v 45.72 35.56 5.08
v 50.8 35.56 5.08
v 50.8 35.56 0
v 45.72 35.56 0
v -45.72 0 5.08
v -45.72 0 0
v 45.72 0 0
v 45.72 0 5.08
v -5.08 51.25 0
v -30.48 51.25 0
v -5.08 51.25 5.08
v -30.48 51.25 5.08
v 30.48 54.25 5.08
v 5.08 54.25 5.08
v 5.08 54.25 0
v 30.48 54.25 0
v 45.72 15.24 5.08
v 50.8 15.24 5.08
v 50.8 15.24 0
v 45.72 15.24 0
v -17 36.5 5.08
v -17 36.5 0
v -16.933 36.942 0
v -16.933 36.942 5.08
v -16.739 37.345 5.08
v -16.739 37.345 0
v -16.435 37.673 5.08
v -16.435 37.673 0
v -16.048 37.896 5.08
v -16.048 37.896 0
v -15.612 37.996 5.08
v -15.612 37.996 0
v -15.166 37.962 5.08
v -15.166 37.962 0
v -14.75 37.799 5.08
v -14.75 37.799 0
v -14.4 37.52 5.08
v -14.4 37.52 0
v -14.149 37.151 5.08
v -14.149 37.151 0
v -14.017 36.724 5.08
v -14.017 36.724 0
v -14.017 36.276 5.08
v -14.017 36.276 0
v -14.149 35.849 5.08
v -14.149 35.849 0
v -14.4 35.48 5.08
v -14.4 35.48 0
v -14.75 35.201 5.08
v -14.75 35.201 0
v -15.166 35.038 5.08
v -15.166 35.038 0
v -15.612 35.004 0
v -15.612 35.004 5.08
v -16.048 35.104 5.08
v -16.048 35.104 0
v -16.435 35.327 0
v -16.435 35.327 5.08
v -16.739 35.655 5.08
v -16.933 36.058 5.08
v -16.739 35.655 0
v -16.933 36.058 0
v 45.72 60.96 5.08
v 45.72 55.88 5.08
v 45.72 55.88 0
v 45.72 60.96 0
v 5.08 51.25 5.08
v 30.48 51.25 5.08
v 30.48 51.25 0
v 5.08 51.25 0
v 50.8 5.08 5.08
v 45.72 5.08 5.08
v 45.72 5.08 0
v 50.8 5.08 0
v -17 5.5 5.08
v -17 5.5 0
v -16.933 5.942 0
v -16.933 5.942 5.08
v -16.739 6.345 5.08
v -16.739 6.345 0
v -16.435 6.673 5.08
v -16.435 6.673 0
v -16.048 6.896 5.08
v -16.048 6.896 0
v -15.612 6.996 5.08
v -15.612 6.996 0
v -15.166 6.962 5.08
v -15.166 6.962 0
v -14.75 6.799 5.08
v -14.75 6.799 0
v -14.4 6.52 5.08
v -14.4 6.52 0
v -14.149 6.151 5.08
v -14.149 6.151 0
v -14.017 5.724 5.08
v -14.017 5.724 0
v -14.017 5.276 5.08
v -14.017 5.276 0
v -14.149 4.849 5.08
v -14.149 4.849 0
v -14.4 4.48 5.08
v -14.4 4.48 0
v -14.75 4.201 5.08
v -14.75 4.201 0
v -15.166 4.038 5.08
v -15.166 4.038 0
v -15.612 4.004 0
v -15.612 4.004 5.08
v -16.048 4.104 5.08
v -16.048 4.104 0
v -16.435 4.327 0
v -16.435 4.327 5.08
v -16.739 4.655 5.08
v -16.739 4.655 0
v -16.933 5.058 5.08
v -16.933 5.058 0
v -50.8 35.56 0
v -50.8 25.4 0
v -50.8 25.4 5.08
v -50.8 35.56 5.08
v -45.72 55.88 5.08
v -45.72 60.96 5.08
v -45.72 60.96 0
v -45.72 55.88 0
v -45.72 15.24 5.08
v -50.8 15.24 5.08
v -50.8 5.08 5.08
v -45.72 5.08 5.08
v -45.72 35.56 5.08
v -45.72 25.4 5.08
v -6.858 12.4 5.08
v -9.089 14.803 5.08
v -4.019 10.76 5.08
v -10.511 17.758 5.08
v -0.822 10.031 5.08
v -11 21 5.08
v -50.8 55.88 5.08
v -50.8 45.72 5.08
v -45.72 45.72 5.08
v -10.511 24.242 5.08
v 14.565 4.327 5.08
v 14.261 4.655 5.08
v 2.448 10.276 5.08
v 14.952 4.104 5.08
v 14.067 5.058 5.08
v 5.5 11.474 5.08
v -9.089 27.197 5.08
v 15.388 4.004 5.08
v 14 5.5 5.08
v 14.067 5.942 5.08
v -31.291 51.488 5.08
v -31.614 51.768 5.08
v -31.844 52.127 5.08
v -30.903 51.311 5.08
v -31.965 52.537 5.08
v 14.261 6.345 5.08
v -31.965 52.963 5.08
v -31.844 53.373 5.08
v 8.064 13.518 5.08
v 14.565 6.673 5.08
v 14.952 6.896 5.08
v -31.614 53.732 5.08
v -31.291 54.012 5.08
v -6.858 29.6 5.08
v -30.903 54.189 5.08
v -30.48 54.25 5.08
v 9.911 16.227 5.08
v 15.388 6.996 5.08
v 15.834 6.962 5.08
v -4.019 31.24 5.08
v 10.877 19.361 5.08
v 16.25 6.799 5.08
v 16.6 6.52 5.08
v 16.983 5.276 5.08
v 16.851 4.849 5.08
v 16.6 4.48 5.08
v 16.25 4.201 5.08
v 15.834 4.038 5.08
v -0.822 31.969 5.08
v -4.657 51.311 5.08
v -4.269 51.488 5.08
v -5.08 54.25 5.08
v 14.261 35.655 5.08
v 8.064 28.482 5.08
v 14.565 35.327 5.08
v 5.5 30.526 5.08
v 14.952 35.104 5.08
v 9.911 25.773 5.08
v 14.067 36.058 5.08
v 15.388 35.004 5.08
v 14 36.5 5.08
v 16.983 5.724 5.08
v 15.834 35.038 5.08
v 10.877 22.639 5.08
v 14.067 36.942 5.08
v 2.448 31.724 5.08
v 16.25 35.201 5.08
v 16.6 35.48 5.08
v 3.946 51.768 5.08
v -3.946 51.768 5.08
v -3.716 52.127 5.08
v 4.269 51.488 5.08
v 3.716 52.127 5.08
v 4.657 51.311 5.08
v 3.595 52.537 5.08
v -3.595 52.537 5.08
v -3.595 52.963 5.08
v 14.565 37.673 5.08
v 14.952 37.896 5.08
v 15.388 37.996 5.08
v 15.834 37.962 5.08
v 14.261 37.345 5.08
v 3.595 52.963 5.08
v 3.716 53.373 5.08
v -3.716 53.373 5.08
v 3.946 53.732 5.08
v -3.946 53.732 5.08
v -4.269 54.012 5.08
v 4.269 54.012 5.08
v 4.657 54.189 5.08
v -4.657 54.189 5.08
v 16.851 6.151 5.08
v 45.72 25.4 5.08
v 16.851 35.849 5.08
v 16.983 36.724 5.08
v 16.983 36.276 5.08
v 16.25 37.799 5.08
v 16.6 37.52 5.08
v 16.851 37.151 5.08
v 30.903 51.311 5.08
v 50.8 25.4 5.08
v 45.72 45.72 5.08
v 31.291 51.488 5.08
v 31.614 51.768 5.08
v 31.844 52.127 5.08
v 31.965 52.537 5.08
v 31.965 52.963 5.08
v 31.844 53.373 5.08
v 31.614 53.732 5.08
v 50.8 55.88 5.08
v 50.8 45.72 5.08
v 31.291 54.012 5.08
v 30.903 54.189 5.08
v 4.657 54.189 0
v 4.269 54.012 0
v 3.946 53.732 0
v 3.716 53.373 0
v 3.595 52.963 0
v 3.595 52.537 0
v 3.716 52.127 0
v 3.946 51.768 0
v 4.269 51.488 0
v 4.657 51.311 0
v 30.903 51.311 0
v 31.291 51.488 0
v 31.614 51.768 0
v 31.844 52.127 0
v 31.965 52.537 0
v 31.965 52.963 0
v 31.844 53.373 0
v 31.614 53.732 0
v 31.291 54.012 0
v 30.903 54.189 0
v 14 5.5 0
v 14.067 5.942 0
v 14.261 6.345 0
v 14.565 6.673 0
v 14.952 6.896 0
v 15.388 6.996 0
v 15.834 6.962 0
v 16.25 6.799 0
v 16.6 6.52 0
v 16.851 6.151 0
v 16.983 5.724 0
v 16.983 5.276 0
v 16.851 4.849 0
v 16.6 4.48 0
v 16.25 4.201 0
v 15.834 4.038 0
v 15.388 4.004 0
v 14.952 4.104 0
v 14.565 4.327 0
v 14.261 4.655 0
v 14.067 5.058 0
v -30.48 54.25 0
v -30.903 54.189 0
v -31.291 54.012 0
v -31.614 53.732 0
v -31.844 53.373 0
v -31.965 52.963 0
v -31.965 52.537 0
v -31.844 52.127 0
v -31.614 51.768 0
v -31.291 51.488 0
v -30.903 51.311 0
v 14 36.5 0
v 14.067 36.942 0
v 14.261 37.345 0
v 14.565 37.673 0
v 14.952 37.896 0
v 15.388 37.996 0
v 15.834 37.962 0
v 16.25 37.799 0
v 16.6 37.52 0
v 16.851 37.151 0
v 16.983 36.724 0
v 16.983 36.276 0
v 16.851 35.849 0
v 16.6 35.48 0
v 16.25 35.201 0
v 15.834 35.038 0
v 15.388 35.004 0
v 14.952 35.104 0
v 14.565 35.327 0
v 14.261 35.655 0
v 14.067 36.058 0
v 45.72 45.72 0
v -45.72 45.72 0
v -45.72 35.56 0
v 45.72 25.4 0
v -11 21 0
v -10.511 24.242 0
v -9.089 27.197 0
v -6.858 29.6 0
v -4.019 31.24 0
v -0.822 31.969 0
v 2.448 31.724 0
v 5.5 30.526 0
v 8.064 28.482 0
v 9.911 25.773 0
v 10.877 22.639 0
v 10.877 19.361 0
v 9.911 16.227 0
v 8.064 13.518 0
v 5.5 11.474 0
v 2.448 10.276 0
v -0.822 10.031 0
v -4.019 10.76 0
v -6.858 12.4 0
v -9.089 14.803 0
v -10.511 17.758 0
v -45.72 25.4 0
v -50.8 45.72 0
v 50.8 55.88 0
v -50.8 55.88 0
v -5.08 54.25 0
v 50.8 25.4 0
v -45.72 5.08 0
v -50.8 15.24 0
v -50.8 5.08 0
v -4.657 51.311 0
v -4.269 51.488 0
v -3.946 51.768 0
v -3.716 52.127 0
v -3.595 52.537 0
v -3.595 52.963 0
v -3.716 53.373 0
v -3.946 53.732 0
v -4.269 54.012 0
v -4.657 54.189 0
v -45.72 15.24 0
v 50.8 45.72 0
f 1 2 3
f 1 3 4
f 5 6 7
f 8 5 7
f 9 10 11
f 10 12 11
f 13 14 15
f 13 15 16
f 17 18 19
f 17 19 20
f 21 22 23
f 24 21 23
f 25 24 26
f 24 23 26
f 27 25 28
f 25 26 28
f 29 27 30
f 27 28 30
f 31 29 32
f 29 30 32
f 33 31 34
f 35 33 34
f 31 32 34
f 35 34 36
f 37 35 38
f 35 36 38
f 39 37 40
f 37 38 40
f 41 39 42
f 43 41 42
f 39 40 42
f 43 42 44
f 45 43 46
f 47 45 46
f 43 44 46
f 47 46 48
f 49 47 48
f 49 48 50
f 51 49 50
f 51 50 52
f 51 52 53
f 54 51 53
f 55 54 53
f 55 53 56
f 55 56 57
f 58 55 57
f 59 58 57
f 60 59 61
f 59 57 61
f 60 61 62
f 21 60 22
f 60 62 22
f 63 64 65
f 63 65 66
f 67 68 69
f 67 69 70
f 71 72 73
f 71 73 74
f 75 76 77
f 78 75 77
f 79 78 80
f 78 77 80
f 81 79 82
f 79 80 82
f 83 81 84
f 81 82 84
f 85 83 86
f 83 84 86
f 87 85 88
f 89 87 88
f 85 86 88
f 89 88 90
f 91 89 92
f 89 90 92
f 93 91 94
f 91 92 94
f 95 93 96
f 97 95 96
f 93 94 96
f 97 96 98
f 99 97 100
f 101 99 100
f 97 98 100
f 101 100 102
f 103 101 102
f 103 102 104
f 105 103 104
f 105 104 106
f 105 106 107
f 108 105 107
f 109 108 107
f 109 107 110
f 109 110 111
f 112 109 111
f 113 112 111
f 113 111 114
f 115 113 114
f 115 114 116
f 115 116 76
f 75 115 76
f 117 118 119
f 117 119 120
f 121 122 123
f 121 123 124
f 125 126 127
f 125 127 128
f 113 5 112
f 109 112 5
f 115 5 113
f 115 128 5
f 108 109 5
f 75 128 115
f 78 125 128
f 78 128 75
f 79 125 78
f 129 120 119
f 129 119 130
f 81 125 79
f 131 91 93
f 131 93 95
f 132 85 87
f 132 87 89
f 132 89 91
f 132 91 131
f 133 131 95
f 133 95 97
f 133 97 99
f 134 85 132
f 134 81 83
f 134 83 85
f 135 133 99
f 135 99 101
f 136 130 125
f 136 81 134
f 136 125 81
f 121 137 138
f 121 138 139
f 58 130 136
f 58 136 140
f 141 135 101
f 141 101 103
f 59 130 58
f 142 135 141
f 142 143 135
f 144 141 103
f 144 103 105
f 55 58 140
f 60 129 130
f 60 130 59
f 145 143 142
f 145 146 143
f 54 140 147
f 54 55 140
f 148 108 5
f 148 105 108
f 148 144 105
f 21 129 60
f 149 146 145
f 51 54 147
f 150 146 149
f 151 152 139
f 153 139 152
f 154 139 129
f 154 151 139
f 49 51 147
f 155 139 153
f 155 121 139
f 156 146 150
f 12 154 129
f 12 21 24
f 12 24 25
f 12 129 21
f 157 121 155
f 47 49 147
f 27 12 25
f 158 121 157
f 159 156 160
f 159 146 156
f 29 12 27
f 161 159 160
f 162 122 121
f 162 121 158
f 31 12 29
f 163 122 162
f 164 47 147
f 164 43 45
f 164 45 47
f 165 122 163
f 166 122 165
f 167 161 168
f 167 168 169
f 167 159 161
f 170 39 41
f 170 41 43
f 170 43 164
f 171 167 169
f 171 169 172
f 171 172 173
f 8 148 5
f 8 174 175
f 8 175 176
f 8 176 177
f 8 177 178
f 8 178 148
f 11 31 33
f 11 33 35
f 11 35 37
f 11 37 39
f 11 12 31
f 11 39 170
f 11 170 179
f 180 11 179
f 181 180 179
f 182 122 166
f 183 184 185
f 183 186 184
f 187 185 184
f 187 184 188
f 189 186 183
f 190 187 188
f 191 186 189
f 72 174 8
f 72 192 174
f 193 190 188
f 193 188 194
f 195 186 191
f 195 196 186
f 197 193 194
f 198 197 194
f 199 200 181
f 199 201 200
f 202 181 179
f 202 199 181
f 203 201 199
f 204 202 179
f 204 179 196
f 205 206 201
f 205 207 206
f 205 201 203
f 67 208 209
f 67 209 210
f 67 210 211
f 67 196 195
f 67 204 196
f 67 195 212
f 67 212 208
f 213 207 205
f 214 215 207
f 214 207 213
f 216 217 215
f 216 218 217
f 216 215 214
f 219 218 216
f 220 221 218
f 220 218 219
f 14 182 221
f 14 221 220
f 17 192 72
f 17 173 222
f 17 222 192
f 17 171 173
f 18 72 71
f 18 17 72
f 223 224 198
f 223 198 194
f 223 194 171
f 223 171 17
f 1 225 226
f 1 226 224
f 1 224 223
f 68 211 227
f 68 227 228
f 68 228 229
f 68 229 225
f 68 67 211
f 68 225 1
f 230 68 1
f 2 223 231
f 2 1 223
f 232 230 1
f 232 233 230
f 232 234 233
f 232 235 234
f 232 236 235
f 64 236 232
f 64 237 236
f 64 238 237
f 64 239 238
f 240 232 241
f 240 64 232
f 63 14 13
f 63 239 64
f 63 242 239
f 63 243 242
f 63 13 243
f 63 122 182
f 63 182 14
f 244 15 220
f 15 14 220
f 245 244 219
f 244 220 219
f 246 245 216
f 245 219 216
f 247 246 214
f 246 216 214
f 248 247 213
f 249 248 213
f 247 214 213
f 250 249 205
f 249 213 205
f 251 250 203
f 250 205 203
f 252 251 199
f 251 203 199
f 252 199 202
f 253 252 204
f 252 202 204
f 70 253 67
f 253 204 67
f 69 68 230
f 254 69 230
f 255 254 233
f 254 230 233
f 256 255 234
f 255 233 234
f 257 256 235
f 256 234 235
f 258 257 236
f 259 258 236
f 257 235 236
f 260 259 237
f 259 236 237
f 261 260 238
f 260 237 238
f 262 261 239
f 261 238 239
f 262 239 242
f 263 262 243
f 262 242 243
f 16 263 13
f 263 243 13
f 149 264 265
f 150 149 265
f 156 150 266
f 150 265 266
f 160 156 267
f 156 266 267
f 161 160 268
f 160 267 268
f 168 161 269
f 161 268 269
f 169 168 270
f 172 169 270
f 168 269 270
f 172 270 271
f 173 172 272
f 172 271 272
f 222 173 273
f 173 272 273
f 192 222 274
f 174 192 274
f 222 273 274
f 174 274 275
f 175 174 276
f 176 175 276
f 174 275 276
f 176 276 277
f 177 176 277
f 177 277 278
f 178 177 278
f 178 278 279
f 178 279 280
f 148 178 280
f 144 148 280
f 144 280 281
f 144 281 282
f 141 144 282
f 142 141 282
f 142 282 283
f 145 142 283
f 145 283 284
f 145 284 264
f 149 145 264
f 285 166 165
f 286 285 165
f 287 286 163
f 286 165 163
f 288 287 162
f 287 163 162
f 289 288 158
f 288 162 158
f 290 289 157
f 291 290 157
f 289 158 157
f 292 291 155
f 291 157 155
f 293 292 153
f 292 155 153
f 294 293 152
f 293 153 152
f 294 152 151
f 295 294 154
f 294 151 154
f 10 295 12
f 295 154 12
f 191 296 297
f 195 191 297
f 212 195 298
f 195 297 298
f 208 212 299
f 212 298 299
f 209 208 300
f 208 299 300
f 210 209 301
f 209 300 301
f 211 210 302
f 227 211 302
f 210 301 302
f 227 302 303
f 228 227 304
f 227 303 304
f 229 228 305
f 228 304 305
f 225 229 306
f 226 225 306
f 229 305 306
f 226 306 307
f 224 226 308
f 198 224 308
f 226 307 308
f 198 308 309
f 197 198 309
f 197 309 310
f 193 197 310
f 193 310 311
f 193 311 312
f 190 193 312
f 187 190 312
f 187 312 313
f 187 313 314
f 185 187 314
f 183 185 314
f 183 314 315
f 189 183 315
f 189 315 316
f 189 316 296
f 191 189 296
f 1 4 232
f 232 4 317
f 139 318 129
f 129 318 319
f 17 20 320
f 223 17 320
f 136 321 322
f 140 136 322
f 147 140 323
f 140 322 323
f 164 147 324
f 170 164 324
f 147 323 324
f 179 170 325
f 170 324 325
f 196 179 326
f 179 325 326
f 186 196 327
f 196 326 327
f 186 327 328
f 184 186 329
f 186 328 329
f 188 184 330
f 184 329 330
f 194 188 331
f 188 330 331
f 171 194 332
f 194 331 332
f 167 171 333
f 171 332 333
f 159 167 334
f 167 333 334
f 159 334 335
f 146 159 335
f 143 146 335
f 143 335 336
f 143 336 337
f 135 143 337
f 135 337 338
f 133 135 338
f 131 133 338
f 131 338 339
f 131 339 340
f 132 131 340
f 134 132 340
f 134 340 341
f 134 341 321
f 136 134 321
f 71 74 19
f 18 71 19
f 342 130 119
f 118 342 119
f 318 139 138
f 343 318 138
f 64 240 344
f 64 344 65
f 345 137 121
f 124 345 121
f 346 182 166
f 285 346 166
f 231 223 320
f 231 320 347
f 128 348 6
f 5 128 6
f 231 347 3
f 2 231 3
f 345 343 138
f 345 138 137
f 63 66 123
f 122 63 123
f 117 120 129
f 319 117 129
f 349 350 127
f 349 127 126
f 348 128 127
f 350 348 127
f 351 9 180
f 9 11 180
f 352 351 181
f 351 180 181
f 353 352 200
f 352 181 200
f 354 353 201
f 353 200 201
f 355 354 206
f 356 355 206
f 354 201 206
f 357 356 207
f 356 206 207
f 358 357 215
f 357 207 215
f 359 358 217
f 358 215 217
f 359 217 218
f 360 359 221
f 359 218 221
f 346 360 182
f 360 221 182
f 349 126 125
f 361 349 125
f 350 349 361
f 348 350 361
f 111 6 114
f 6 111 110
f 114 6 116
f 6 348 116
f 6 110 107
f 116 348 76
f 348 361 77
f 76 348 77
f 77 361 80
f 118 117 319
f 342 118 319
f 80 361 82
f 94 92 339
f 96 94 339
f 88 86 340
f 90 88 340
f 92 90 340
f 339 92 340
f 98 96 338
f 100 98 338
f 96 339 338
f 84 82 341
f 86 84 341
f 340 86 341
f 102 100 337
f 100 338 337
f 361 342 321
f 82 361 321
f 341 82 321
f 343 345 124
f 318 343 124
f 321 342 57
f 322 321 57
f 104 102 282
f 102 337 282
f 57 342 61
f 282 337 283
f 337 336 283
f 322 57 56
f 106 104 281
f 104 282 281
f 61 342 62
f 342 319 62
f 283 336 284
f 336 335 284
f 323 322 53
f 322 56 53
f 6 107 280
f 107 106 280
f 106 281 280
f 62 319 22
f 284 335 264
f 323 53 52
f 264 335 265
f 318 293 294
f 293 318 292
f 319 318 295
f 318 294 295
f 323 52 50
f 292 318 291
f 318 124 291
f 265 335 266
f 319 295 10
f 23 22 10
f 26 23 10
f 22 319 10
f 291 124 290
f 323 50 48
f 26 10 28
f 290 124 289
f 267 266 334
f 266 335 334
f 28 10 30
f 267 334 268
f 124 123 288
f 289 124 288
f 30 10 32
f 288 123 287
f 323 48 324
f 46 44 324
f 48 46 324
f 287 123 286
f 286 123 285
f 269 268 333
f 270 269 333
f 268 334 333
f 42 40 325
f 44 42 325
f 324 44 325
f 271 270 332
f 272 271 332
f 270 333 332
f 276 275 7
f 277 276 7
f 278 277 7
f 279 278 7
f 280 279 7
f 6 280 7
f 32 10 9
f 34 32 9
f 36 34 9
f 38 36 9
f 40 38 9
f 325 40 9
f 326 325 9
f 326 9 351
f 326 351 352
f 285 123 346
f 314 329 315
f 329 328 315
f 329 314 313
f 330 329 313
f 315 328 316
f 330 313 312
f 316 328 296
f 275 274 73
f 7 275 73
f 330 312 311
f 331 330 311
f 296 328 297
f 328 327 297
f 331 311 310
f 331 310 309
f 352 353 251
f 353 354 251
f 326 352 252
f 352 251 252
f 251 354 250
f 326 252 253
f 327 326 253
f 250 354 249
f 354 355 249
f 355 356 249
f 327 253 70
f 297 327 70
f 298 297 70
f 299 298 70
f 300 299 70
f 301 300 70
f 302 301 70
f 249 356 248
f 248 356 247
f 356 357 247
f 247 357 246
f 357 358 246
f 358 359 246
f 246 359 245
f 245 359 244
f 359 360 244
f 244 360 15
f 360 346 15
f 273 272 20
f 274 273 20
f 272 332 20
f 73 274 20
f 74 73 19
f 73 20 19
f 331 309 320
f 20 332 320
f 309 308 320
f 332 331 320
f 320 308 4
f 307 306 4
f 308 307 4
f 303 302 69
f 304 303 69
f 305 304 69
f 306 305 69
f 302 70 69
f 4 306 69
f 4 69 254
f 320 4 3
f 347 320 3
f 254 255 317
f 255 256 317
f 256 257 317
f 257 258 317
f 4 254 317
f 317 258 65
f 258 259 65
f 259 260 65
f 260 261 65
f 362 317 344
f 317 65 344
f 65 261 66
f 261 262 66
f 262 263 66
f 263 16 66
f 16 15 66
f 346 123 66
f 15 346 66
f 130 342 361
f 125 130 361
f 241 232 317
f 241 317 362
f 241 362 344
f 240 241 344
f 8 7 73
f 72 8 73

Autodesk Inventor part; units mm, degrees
ref_plane "YZ Plane" through (0, 0, 0) normal (1, 0, 0) x (0, 1, 0)
ref_plane "XZ Plane" through (0, 0, 0) normal (0, 1, 0) x (-1, 0, 0)
ref_plane "XY Plane" through (0, 0, 0) normal (0, 0, 1) x (1, 0, 0)
sketch "Sketch1" plane through (0, 0, 0) normal (0, 0, 1) x (1, 0, 0)
  line L0 (45.72, 0) -> (45.72, 60.96)
  line L1 (45.72, 60.96) -> (-45.72, 60.96)
  line L2 (-45.72, 60.96) -> (-45.72, 9.301)
  line L3 (-45.72, 5.08) -> (-50.8, 5.08)
  line L4 (-50.8, 5.08) -> (-50.8, 15.24)
  line L5 (-50.8, 15.24) -> (-45.72, 15.24)
  line L6 (-45.72, 15.24) -> (-45.72, 5.08)
  line L7 (-45.72, 25.4) -> (-50.8, 25.4)
  line L8 (-50.8, 25.4) -> (-50.8, 35.56)
  line L9 (-50.8, 35.56) -> (-45.72, 35.56)
  line L10 (-45.72, 35.56) -> (-45.72, 25.4)
  line L11 (-45.72, 45.72) -> (-50.8, 45.72)
  line L12 (-50.8, 45.72) -> (-50.8, 55.88)
  line L13 (-50.8, 55.88) -> (-45.72, 55.88)
  line L14 (-45.72, 55.88) -> (-45.72, 45.72)
  line L15 (0, 60.96) -> (0, 0) construction
  line L16 (45.72, 60.96) -> (45.72, 0)
  line L17 (45.72, 5.08) -> (50.8, 5.08)
  line L18 (50.8, 5.08) -> (50.8, 15.24)
  line L19 (50.8, 15.24) -> (45.72, 15.24)
  line L20 (45.72, 15.24) -> (45.72, 5.08)
  line L21 (45.72, 25.4) -> (50.8, 25.4)
  line L22 (50.8, 25.4) -> (50.8, 35.56)
  line L23 (50.8, 35.56) -> (45.72, 35.56)
  line L24 (45.72, 35.56) -> (45.72, 25.4)
  line L25 (45.72, 45.72) -> (50.8, 45.72)
  line L26 (50.8, 45.72) -> (50.8, 55.88)
  line L27 (50.8, 55.88) -> (45.72, 55.88)
  line L28 (45.72, 55.88) -> (45.72, 45.72)
  line L29 (-45.72, 5.08) -> (-45.72, 0)
  line L30 (-45.72, 0) -> (45.72, 0)
  line L31 (45.72, 60.96) -> (-45.72, 60.96)
  line L32 (-45.72, 60.96) -> (-45.72, 0)
  line L33 (-45.72, 0) -> (45.72, 0)
  line L34 (45.72, 0) -> (45.72, 60.96)
  dimension "d0" = 91.44
  dimension "d2" = 10.16
  dimension "d3" = 5.08
  dimension "d7" = 20.32
  dimension "d14" = 5.08
  dimension "d15" = 60.96
extrude "Extrusion2" add sketch "Sketch1" along normal blind 5.08
sketch "Sketch2" plane through (0, 0, 0) normal (0, 0, -1) x (-1, 0, 0)
  circle A0 centre (-15.5, 5.5) radius 1.5 projected
  circle A1 centre (15.5, 36.5) radius 1.5 projected
  circle A2 centre (-15.5, 36.5) radius 1.5 projected
  circle A3 centre (15.5, 5.5) radius 1.5 projected
  line L0 (21, 3.175) -> (17.825, 0) projected
  line L1 (21, 38.825) -> (21, 3.175) projected
  line L2 (17.825, 42) -> (21, 38.825) projected
  line L3 (-17.825, 42) -> (17.825, 42) projected
  line L4 (-21, 38.825) -> (-17.825, 42) projected
  line L5 (-21, 3.175) -> (-21, 38.825) projected
  line L6 (-17.825, 0) -> (-21, 3.175) projected
  line L7 (17.825, 0) -> (-17.825, 0) projected
  circle A4 centre (0, 21) radius 11 projected
  circle A5 centre (0, 21) radius 2.25 projected
  point P0 (0, 0)
extrude "Extrusion3" cut sketch "Sketch2" against normal blind 25.4 contours A0 | A1 | A2 | A3 | A4 | A5
sketch "Sketch4" plane through (0, 0, 5.08) normal (0, 0, 1) x (1, 0, 0)
  line L0 (0, 0) -> (0, 60.96) construction
  line L1 (45.72, 60.96) -> (-45.72, 60.96) construction
  line L2 (-30.48, 52.75) -> (-5.08, 52.75) construction
  line L3 (-30.48, 51.25) -> (-5.08, 51.25)
  line L4 (-5.08, 54.25) -> (-30.48, 54.25)
  arc A0 (-30.48, 54.25) -> (-30.48, 51.25) centre (-30.48, 52.75) ccw
  arc A1 (-5.08, 51.25) -> (-5.08, 54.25) centre (-5.08, 52.75) ccw
  line L5 (30.48, 52.75) -> (5.08, 52.75) construction
  line L6 (30.48, 51.25) -> (5.08, 51.25)
  line L7 (5.08, 54.25) -> (30.48, 54.25)
  arc A2 (30.48, 51.25) -> (30.48, 54.25) centre (30.48, 52.75) ccw
  arc A3 (5.08, 54.25) -> (5.08, 51.25) centre (5.08, 52.75) ccw
  circle A4 centre (0, 21) radius 11 projected
  line L8 (-11, 21) -> (0, 21)
  point P0 (-17.78, 52.75)
  point P1 (17.78, 52.75)
  dimension "d25" = 3
  dimension "d26" = 25.4
  dimension "d28" = 17.78
  dimension "d31" = 31.75
extrude "Extrusion5" cut sketch "Sketch4" against normal blind 25.4 contours A0 L4 A1 L3 | L6 A3 L7 A2
sketch "Sketch5" plane through (0, 0, 5.08) normal (0, 0, 1) x (1, 0, 0)
  arc A0 (-5.08, 51.25) -> (-5.08, 54.25) centre (-5.08, 52.75) ccw projected
  line L0 (-5.08, 51.25) -> (-30.48, 51.25) projected
  arc A1 (-30.48, 54.25) -> (-30.48, 51.25) centre (-30.48, 52.75) ccw projected
  line L1 (-30.48, 54.25) -> (-5.08, 54.25) projected
  arc A2 (30.48, 51.25) -> (30.48, 54.25) centre (30.48, 52.75) ccw projected
  line L2 (30.48, 51.25) -> (5.08, 51.25) projected
  arc A3 (5.08, 54.25) -> (5.08, 51.25) centre (5.08, 52.75) ccw projected
  line L3 (5.08, 54.25) -> (30.48, 54.25) projected
  circle A4 centre (-15.5, 5.5) radius 1.5 projected
  circle A5 centre (-15.5, 36.5) radius 1.5 projected
  circle A6 centre (15.5, 5.5) radius 1.5 projected
  circle A7 centre (15.5, 36.5) radius 1.5 projected
  circle A8 centre (0, 21) radius 11 projected
  line L4 (50.8, 25.4) -> (50.8, 35.56) projected
  line L5 (50.8, 35.56) -> (45.72, 35.56) projected
  line L6 (45.72, 35.56) -> (45.72, 45.72) projected
  line L7 (45.72, 45.72) -> (50.8, 45.72) projected
  line L8 (50.8, 45.72) -> (50.8, 55.88) projected
  line L9 (50.8, 55.88) -> (45.72, 55.88) projected
  line L10 (45.72, 55.88) -> (45.72, 60.96) projected
  line L11 (45.72, 60.96) -> (-45.72, 60.96) projected
  line L12 (-45.72, 60.96) -> (-45.72, 55.88) projected
  line L13 (-45.72, 55.88) -> (-50.8, 55.88) projected
  line L14 (-50.8, 55.88) -> (-50.8, 45.72) projected
  line L15 (-50.8, 45.72) -> (-45.72, 45.72) projected
  line L16 (-45.72, 45.72) -> (-45.72, 35.56) projected
  line L17 (-45.72, 35.56) -> (-50.8, 35.56) projected
  line L18 (-50.8, 35.56) -> (-50.8, 25.4) projected
  line L19 (-50.8, 25.4) -> (-45.72, 25.4) projected
  line L20 (-45.72, 25.4) -> (-45.72, 15.24) projected
  line L21 (-45.72, 15.24) -> (-50.8, 15.24) projected
  line L22 (-50.8, 15.24) -> (-50.8, 5.08) projected
  line L23 (-50.8, 5.08) -> (-45.72, 5.08) projected
  line L24 (-45.72, 5.08) -> (-45.72, 0) projected
  line L25 (-45.72, 0) -> (45.72, 0) projected
  line L26 (45.72, 0) -> (45.72, 5.08) projected
  line L27 (45.72, 5.08) -> (50.8, 5.08) projected
  line L28 (50.8, 5.08) -> (50.8, 15.24) projected
  line L29 (50.8, 15.24) -> (45.72, 15.24) projected
  line L30 (45.72, 15.24) -> (45.72, 25.4) projected
  line L31 (45.72, 25.4) -> (50.8, 25.4) projected
  point P0 (0, 0)
  dimension "d32" = 21
equation "\"d7\" = 2 * d2"
properties part number "VerticalSupport" material "Wood (Birch)"
